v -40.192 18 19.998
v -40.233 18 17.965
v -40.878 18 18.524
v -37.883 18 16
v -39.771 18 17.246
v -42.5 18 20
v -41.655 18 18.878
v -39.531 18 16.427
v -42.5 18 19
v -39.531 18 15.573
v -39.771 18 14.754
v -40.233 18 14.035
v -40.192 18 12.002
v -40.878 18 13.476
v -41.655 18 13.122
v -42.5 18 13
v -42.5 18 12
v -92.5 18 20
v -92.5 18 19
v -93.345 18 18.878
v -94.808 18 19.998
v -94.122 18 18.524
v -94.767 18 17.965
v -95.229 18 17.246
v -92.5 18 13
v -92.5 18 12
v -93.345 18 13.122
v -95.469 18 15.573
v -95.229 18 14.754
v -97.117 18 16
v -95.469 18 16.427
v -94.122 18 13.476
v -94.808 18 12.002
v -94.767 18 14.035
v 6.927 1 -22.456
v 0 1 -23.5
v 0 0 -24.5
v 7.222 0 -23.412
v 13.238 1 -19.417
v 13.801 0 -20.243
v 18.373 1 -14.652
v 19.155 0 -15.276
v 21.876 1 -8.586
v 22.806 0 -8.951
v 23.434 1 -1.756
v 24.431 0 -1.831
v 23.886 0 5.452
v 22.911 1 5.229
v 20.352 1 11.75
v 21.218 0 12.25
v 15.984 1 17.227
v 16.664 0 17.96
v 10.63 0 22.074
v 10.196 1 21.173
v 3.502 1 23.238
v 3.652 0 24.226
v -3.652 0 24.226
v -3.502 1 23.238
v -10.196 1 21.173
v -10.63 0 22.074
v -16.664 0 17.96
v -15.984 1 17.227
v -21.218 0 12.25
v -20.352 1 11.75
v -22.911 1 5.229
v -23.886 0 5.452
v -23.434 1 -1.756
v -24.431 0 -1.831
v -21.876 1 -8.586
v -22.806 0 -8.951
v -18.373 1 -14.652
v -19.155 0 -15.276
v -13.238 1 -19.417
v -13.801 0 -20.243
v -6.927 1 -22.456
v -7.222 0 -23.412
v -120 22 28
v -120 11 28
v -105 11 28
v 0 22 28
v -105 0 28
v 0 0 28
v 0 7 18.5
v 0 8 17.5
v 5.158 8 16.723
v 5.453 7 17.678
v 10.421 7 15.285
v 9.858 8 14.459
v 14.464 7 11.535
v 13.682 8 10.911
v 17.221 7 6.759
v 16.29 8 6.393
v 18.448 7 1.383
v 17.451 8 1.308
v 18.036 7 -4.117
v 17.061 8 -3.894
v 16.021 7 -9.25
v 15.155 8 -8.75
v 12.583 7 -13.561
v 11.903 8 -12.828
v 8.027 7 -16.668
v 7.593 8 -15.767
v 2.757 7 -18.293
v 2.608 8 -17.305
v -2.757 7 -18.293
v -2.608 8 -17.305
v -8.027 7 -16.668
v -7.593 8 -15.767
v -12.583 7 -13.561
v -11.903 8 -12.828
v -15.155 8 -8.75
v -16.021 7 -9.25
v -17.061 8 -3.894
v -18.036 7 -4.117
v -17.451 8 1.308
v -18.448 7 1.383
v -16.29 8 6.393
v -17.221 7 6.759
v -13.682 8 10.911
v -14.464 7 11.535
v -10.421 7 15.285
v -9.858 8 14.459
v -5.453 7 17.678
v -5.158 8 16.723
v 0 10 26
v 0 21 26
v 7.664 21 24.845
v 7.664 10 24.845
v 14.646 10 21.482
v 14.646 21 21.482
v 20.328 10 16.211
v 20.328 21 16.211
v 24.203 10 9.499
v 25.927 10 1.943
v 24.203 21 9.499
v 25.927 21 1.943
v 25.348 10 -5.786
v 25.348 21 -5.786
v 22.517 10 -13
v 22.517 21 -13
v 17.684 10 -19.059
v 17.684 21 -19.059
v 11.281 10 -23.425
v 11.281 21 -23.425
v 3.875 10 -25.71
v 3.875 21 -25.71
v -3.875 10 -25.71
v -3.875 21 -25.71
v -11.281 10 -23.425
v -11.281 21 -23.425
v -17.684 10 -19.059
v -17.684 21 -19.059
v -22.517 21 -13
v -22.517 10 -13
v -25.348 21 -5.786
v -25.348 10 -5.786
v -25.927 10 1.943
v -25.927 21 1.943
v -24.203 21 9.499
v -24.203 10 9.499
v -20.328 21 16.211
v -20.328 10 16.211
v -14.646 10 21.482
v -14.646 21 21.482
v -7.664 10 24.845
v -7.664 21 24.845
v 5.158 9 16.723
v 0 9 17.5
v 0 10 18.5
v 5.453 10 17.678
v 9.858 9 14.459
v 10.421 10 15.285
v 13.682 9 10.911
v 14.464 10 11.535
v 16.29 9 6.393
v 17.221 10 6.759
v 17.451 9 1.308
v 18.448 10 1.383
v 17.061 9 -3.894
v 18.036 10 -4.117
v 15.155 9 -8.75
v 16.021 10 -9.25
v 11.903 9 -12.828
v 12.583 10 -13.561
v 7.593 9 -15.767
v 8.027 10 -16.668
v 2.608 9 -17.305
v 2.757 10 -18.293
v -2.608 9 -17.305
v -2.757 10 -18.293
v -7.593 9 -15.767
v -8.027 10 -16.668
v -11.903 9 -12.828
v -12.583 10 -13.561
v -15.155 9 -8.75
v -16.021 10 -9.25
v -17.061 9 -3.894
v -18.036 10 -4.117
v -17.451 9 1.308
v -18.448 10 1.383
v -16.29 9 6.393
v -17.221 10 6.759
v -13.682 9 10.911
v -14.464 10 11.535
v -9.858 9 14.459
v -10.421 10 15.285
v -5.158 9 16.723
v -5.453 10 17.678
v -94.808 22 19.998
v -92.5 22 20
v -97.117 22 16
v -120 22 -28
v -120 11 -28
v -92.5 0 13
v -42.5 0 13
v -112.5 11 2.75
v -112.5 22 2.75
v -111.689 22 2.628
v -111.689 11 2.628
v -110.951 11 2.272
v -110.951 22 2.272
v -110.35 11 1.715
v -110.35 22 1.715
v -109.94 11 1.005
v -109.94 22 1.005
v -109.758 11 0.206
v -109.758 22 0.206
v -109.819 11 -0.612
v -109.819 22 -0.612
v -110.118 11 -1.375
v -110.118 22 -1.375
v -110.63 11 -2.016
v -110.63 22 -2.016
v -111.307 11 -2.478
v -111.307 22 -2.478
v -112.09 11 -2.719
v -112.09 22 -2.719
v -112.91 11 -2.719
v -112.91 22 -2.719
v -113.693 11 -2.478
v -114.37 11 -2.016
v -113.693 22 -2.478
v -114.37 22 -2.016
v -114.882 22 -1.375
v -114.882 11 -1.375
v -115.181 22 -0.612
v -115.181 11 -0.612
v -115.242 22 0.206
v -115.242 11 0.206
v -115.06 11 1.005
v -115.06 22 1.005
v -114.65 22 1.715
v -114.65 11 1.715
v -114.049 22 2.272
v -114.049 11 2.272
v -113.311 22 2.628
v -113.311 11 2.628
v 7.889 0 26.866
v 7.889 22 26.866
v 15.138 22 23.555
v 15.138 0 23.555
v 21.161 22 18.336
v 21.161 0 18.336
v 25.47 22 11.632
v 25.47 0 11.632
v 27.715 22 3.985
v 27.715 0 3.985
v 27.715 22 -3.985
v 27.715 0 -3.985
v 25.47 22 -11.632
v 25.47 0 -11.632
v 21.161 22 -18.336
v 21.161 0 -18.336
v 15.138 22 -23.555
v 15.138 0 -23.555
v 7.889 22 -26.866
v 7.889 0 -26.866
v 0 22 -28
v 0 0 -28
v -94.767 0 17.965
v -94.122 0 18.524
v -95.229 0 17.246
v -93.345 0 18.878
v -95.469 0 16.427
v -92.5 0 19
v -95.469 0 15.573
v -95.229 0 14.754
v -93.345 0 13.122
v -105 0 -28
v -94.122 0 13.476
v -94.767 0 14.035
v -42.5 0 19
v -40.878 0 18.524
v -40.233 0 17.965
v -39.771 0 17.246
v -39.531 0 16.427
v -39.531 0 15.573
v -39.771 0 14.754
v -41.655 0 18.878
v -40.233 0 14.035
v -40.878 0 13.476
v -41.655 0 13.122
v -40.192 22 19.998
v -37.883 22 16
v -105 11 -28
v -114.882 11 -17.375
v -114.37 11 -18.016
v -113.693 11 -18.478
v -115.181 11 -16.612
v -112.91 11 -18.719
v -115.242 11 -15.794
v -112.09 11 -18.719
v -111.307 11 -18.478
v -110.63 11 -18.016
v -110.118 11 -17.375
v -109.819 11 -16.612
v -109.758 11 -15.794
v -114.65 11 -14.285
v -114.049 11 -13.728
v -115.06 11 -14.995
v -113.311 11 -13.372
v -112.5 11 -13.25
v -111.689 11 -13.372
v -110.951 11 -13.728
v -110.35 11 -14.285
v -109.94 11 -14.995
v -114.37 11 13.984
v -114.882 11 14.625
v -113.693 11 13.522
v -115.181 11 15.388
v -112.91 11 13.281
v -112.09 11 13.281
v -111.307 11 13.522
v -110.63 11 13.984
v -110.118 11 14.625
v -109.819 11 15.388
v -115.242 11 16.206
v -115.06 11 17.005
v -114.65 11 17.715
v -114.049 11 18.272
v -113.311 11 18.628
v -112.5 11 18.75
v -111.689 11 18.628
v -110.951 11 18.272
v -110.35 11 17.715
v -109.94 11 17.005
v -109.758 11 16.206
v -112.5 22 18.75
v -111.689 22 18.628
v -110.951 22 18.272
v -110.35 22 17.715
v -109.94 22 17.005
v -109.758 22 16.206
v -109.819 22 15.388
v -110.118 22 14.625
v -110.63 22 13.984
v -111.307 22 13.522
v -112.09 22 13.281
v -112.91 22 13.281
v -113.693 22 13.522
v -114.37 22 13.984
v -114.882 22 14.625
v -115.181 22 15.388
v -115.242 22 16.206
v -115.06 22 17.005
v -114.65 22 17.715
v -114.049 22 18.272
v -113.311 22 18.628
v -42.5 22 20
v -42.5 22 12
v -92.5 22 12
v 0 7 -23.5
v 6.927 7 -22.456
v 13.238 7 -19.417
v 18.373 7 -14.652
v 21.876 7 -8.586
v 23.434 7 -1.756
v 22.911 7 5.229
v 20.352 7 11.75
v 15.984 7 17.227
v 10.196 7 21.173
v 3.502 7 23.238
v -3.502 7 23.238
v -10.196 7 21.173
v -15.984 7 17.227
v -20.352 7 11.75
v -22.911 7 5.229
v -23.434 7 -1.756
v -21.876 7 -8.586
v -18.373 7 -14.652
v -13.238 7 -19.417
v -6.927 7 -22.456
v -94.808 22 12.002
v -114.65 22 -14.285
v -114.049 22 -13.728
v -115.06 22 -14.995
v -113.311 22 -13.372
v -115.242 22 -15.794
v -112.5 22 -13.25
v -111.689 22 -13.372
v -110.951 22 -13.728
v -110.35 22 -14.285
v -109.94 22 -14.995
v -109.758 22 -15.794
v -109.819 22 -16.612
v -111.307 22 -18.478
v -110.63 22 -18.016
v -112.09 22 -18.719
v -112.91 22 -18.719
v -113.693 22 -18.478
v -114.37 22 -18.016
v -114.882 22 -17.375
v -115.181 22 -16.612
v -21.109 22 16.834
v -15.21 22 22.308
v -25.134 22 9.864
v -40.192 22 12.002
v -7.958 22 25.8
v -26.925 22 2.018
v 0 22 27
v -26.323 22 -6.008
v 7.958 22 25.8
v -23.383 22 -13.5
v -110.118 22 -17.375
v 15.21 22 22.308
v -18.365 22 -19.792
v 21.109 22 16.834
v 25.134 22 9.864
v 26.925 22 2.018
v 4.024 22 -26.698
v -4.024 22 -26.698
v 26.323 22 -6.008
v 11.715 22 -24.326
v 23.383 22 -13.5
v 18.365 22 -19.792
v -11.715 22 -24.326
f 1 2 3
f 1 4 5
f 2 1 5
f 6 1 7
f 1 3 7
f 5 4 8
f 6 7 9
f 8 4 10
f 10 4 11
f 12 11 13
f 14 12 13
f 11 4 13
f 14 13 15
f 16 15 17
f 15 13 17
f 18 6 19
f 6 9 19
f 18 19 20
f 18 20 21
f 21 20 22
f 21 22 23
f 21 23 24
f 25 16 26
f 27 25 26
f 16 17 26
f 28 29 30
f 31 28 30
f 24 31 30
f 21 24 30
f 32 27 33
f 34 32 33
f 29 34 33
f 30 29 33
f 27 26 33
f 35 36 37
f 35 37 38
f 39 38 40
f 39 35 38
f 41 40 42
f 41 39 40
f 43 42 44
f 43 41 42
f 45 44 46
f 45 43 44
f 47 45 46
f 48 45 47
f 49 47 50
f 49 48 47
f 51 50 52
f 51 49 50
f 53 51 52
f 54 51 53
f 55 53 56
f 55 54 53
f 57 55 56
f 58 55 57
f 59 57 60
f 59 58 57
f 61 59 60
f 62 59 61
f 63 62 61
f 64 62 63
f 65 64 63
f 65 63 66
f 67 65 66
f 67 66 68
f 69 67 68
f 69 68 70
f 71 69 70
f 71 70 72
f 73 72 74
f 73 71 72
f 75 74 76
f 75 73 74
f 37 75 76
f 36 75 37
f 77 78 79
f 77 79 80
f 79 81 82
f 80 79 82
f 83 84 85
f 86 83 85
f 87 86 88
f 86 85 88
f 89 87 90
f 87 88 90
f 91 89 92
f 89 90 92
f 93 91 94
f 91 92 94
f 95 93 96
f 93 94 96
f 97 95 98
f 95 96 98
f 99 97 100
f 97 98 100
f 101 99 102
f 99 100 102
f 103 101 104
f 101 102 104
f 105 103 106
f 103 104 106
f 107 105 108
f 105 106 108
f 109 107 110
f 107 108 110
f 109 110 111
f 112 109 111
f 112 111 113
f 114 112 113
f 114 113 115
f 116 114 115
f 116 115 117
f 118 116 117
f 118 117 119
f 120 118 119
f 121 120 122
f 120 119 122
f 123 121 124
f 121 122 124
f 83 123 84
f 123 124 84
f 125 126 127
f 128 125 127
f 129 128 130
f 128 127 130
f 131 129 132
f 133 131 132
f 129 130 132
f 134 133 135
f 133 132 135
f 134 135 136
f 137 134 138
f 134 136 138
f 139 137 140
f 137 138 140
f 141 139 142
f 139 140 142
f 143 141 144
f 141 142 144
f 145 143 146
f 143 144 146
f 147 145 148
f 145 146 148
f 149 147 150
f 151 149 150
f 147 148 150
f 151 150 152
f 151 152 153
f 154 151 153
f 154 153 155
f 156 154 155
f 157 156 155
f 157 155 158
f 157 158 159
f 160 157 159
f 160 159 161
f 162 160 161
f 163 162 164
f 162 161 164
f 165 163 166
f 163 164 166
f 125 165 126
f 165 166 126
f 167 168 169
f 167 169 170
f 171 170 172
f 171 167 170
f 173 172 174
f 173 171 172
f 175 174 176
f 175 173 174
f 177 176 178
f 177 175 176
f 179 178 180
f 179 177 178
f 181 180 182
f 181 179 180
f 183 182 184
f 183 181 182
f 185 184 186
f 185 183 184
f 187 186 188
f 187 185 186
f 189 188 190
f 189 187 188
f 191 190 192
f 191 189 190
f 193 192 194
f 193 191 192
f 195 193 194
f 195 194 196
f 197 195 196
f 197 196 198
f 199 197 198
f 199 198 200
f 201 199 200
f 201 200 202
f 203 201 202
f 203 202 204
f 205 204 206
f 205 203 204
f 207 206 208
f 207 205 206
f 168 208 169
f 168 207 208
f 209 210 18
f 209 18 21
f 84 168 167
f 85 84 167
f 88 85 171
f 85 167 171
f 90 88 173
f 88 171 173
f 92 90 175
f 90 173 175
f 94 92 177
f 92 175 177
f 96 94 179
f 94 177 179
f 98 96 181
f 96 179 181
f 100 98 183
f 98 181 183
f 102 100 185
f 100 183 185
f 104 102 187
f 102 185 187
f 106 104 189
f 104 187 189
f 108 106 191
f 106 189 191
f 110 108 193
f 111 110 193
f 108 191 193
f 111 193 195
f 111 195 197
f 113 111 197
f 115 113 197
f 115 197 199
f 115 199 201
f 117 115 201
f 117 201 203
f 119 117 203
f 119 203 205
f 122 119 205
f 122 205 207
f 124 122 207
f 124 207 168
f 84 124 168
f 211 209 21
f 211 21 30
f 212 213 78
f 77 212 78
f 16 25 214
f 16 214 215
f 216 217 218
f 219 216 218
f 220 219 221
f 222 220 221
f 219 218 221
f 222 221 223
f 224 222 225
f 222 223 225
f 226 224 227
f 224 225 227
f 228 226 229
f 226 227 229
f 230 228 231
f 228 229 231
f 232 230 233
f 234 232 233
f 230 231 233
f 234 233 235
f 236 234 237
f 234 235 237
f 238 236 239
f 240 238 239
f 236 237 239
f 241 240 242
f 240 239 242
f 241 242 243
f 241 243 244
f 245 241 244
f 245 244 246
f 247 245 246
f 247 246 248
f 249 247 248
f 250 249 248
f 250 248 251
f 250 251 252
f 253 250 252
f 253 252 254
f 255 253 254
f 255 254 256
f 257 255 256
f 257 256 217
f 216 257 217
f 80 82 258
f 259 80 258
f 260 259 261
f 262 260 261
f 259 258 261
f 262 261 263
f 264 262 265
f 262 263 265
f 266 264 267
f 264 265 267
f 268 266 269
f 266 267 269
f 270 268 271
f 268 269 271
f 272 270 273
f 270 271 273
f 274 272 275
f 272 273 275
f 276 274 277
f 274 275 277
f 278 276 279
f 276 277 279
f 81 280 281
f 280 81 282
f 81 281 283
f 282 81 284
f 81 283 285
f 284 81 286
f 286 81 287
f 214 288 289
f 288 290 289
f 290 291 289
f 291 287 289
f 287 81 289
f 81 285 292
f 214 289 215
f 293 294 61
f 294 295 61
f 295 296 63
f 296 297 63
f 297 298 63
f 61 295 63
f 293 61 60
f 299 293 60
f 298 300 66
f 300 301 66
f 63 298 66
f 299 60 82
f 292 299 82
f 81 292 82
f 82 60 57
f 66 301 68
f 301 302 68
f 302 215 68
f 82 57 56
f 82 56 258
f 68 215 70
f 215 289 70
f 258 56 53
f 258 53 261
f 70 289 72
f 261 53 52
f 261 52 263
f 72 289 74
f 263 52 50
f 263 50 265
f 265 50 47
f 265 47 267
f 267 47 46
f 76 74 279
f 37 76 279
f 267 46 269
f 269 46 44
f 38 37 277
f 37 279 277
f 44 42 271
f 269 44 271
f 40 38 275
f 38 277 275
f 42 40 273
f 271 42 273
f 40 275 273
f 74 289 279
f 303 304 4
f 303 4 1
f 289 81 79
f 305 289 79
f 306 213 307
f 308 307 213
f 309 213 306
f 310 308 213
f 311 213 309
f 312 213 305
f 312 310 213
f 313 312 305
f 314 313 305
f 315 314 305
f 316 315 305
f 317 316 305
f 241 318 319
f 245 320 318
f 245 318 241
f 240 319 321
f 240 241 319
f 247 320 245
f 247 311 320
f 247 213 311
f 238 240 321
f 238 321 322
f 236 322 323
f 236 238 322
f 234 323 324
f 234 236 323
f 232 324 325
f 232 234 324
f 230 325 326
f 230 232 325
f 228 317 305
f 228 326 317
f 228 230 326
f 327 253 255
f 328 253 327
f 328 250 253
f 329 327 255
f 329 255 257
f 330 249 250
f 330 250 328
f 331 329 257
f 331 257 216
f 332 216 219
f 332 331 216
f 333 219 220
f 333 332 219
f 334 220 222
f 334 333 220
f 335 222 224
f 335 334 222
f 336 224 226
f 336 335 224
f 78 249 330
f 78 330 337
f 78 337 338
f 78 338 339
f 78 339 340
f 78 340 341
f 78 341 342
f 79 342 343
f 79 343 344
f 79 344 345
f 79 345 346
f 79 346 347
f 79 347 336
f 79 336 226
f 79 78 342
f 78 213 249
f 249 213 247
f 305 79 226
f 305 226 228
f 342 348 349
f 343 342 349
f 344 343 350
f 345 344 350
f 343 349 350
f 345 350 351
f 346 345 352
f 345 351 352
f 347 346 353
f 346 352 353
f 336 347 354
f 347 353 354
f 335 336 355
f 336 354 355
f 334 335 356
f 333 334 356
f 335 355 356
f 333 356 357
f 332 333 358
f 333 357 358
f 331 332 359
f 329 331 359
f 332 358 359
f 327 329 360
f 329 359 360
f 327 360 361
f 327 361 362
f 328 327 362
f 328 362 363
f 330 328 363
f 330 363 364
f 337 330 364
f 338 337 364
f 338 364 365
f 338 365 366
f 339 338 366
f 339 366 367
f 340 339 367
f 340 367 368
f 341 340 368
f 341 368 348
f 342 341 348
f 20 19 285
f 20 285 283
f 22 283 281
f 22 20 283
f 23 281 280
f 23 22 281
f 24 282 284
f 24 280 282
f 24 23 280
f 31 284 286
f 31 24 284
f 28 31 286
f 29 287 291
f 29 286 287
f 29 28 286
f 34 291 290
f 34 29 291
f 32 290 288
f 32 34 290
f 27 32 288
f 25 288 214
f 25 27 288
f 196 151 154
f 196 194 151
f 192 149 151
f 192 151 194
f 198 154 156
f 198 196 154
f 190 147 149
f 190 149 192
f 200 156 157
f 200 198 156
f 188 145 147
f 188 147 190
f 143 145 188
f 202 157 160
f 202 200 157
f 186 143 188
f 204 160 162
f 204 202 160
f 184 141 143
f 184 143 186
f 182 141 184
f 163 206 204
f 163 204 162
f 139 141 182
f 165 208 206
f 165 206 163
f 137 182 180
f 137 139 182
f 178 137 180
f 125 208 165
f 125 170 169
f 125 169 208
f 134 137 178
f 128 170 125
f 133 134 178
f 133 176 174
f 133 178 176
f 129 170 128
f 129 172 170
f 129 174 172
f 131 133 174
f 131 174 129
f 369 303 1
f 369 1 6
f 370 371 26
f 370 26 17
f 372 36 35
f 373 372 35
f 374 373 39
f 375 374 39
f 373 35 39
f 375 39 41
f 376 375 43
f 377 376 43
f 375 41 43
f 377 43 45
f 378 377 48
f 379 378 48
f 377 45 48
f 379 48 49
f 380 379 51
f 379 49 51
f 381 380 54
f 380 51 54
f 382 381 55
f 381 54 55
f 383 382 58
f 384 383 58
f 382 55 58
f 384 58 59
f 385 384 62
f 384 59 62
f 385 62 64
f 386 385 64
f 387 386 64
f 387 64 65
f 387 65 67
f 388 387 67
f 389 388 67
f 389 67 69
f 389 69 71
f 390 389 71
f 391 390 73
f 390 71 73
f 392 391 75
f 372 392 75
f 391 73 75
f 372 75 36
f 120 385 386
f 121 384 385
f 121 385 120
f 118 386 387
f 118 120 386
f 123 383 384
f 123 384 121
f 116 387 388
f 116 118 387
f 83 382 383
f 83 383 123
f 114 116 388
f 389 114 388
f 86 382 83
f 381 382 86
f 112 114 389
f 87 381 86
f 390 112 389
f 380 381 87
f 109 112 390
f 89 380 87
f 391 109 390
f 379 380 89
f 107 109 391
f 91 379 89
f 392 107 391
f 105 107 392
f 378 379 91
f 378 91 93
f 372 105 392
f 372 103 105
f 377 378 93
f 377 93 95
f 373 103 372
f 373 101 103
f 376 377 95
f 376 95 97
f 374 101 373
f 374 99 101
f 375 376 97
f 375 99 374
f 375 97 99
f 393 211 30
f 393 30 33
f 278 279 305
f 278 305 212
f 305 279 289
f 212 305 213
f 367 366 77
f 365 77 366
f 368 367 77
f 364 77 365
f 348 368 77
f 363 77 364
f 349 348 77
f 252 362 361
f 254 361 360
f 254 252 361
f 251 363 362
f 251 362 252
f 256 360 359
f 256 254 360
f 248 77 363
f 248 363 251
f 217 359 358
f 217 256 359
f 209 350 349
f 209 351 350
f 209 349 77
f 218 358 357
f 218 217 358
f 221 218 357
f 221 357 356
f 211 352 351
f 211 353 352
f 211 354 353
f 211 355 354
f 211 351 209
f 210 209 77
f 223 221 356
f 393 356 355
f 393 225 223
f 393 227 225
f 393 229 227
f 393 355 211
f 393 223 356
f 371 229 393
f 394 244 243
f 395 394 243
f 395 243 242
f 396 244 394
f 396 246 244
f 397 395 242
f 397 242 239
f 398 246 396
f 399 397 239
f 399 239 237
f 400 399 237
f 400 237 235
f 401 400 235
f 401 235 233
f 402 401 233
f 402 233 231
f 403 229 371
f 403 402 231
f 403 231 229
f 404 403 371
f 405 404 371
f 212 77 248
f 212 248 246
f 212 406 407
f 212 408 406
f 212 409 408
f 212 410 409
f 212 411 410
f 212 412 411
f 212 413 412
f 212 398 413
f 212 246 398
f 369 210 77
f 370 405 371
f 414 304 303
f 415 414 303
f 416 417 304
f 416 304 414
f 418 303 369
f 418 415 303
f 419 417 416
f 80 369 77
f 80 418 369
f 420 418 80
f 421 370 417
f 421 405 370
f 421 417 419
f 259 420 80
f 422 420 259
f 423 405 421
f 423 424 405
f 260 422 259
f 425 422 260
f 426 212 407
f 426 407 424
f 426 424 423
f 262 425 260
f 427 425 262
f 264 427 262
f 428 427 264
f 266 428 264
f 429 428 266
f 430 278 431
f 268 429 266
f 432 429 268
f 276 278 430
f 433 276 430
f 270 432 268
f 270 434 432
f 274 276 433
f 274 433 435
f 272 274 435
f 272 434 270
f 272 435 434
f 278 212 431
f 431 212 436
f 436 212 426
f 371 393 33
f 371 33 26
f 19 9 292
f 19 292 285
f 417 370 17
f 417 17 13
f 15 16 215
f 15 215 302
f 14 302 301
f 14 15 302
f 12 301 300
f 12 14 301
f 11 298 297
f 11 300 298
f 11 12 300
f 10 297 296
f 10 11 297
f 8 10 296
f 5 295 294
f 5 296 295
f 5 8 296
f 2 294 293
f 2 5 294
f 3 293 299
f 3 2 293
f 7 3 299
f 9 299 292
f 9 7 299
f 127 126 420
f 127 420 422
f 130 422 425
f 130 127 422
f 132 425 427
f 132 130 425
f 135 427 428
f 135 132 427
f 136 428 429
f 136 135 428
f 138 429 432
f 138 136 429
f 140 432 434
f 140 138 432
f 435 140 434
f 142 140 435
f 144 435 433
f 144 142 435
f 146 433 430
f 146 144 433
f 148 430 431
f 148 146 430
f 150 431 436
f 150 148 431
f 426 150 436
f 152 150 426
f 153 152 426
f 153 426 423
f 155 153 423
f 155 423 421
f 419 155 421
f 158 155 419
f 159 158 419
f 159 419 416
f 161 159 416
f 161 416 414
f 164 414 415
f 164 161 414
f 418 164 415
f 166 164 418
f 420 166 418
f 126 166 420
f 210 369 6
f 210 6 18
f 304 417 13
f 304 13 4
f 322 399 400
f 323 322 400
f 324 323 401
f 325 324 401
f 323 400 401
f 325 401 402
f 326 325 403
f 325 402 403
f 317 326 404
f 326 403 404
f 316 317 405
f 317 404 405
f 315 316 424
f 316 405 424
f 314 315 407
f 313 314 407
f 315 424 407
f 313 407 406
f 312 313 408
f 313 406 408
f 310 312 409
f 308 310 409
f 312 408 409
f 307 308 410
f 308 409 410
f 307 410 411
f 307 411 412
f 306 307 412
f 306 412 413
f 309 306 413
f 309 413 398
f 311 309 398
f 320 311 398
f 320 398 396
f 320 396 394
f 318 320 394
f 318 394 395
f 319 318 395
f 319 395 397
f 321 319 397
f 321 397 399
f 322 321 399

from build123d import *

# Parameters (mm, degrees)
EXTRUDE_1_DEPTH     = 22
CUT_EXTRUDE_1_REACH = 136.239
SKETCH_2_W          = 15
SKETCH_2_H          = 11
SKETCH_3_R          = 26
CUT_EXTRUDE_2_DEPTH = 12
CUT_EXTRUDE_3_REACH = 125.806
SKETCH_4_R          = 17.5
SKETCH_5_R          = 23.5
CUT_EXTRUDE_4_DEPTH = 7
CHAMFER_1_SIZE      = 1
CUT_EXTRUDE_5_REACH = 127.172
SKETCH_6_R          = 2.75
CUT_EXTRUDE_7_REACH = 127.172
CUT_EXTRUDE_8_DEPTH = 4


with BuildPart() as part:
    # 草图1 → 凸台-拉伸1 (new body)
    with BuildSketch(Plane(origin=(0, 0, 0), x_dir=(1, 0, 0), z_dir=(0, 1, 0))):
        with BuildLine():
            Line((0, 28), (-120, 28))
            Line((-120, 28), (-120, -28))
            Line((-120, -28), (0, -28))
            ThreePointArc((0, -28), (28, 0), (0, 28))
        make_face()
    extrude(amount=EXTRUDE_1_DEPTH)

    # 草图2 → 切除-拉伸1 (cut, up to next)
    with BuildSketch(Plane.XY.offset(28), mode=Mode.PRIVATE) as cut_extrude_1_sk1:
        with Locations((-112.5, 5.5)):
            Rectangle(SKETCH_2_W, SKETCH_2_H)
    cut_extrude_1_tool1 = extrude(cut_extrude_1_sk1.sketch, amount=-CUT_EXTRUDE_1_REACH, mode=Mode.PRIVATE) & part.part
    add(cut_extrude_1_tool1.solids().sort_by_distance((-112.5, 5.5, 28))[0], mode=Mode.SUBTRACT)

    # 草图3 → 切除-拉伸2 (cut)
    with BuildSketch(Plane(origin=(0, 22, 0), x_dir=(1, 0, 0), z_dir=(0, 1, 0))):
        with Locations(Location((0, 0, 0), (0, 0, 270))):
            Circle(SKETCH_3_R)
    extrude(amount=-CUT_EXTRUDE_2_DEPTH, mode=Mode.SUBTRACT)

    # 草图4 → 切除-拉伸3 (cut, up to next)
    with BuildSketch(Plane(origin=(0, 10, 0), x_dir=(1, 0, 0), z_dir=(0, 1, 0)), mode=Mode.PRIVATE) as cut_extrude_3_sk1:
        with Locations(Location((0, 0, 0), (0, 0, 270))):
            Circle(SKETCH_4_R)
    cut_extrude_3_tool1 = extrude(cut_extrude_3_sk1.sketch, amount=-CUT_EXTRUDE_3_REACH, mode=Mode.PRIVATE) & part.part
    add(cut_extrude_3_tool1.solids().sort_by_distance((0, 10, 0))[0], mode=Mode.SUBTRACT)

    # 草图5 → 切除-拉伸4 (cut)
    with BuildSketch(Plane.XZ):
        with Locations(Location((0, 0, 0), (0, 0, 270))):
            Circle(SKETCH_5_R)
    extrude(amount=-CUT_EXTRUDE_4_DEPTH, mode=Mode.SUBTRACT)

    # 倒角1
    chamfer_1_edges = [part.edges().sort_by_distance(p)[0] for p in [
        (0, 22, -26),
        (0, 10, -17.5),
        (0, 0, 23.5),
        (0, 7, -17.5),
    ]]
    chamfer(chamfer_1_edges, length=CHAMFER_1_SIZE)

    # 草图6 → 切除-拉伸5 (cut, up to next)
    with BuildSketch(Plane(origin=(0, 22, 0), x_dir=(1, 0, 0), z_dir=(0, 1, 0)), mode=Mode.PRIVATE) as cut_extrude_5_sk1:
        with Locations(Location((-112.5, 0, 0), (0, 0, 270))):
            Circle(SKETCH_6_R)
    cut_extrude_5_tool1 = extrude(cut_extrude_5_sk1.sketch, amount=-CUT_EXTRUDE_5_REACH, mode=Mode.PRIVATE) & part.part
    # 草图6 → 切除-拉伸5 (cut, up to next)
    with BuildSketch(Plane(origin=(0, 22, 0), x_dir=(1, 0, 0), z_dir=(0, 1, 0)), mode=Mode.PRIVATE) as cut_extrude_5_sk2:
        with Locations(Location((-112.5, 16, 0), (0, 0, 270))):
            Circle(SKETCH_6_R)
    cut_extrude_5_tool2 = extrude(cut_extrude_5_sk2.sketch, amount=-CUT_EXTRUDE_5_REACH, mode=Mode.PRIVATE) & part.part
    # 草图6 → 切除-拉伸5 (cut, up to next)
    with BuildSketch(Plane(origin=(0, 22, 0), x_dir=(1, 0, 0), z_dir=(0, 1, 0)), mode=Mode.PRIVATE) as cut_extrude_5_sk3:
        with Locations(Location((-112.5, -16, 0), (0, 0, 270))):
            Circle(SKETCH_6_R)
    cut_extrude_5_tool3 = extrude(cut_extrude_5_sk3.sketch, amount=-CUT_EXTRUDE_5_REACH, mode=Mode.PRIVATE) & part.part
    add(cut_extrude_5_tool1.solids().sort_by_distance((-112.5, 22, 0))[0], mode=Mode.SUBTRACT)
    add(cut_extrude_5_tool2.solids().sort_by_distance((-112.5, 22, -16))[0], mode=Mode.SUBTRACT)
    add(cut_extrude_5_tool3.solids().sort_by_distance((-112.5, 22, 16))[0], mode=Mode.SUBTRACT)

    # 草图8 → 切除-拉伸7 (cut, up to next)
    with BuildSketch(Plane(origin=(0, 22, 0), x_dir=(1, 0, 0), z_dir=(0, 1, 0)), mode=Mode.PRIVATE) as cut_extrude_7_sk1:
        with BuildLine():
            ThreePointArc((-42.5, -13), (-39.5, -16), (-42.5, -19))
            Line((-42.5, -19), (-92.5, -19))
            ThreePointArc((-92.5, -19), (-95.5, -16), (-92.5, -13))
            Line((-92.5, -13), (-42.5, -13))
        make_face()
    cut_extrude_7_tool1 = extrude(cut_extrude_7_sk1.sketch, amount=-CUT_EXTRUDE_7_REACH, mode=Mode.PRIVATE) & part.part
    add(cut_extrude_7_tool1.solids().sort_by_distance((-67.5, 22, 16))[0], mode=Mode.SUBTRACT)

    # 草图8<3> → 切除-拉伸8 (cut)
    with BuildSketch(Plane(origin=(0, 22, 0), x_dir=(1, 0, 0), z_dir=(0, 1, 0))):
        Polygon((-92.5, -12), (-42.5, -12), (-40.191634991, -12.001796941), (-37.883271378, -16), (-40.191636387, -19.998205479), (-42.5, -20), (-92.5, -20), (-94.808363613, -19.998205479), (-97.116728622, -16), (-94.808365009, -12.001796941), align=None)
    extrude(amount=-CUT_EXTRUDE_8_DEPTH, mode=Mode.SUBTRACT)


solid = part.part
